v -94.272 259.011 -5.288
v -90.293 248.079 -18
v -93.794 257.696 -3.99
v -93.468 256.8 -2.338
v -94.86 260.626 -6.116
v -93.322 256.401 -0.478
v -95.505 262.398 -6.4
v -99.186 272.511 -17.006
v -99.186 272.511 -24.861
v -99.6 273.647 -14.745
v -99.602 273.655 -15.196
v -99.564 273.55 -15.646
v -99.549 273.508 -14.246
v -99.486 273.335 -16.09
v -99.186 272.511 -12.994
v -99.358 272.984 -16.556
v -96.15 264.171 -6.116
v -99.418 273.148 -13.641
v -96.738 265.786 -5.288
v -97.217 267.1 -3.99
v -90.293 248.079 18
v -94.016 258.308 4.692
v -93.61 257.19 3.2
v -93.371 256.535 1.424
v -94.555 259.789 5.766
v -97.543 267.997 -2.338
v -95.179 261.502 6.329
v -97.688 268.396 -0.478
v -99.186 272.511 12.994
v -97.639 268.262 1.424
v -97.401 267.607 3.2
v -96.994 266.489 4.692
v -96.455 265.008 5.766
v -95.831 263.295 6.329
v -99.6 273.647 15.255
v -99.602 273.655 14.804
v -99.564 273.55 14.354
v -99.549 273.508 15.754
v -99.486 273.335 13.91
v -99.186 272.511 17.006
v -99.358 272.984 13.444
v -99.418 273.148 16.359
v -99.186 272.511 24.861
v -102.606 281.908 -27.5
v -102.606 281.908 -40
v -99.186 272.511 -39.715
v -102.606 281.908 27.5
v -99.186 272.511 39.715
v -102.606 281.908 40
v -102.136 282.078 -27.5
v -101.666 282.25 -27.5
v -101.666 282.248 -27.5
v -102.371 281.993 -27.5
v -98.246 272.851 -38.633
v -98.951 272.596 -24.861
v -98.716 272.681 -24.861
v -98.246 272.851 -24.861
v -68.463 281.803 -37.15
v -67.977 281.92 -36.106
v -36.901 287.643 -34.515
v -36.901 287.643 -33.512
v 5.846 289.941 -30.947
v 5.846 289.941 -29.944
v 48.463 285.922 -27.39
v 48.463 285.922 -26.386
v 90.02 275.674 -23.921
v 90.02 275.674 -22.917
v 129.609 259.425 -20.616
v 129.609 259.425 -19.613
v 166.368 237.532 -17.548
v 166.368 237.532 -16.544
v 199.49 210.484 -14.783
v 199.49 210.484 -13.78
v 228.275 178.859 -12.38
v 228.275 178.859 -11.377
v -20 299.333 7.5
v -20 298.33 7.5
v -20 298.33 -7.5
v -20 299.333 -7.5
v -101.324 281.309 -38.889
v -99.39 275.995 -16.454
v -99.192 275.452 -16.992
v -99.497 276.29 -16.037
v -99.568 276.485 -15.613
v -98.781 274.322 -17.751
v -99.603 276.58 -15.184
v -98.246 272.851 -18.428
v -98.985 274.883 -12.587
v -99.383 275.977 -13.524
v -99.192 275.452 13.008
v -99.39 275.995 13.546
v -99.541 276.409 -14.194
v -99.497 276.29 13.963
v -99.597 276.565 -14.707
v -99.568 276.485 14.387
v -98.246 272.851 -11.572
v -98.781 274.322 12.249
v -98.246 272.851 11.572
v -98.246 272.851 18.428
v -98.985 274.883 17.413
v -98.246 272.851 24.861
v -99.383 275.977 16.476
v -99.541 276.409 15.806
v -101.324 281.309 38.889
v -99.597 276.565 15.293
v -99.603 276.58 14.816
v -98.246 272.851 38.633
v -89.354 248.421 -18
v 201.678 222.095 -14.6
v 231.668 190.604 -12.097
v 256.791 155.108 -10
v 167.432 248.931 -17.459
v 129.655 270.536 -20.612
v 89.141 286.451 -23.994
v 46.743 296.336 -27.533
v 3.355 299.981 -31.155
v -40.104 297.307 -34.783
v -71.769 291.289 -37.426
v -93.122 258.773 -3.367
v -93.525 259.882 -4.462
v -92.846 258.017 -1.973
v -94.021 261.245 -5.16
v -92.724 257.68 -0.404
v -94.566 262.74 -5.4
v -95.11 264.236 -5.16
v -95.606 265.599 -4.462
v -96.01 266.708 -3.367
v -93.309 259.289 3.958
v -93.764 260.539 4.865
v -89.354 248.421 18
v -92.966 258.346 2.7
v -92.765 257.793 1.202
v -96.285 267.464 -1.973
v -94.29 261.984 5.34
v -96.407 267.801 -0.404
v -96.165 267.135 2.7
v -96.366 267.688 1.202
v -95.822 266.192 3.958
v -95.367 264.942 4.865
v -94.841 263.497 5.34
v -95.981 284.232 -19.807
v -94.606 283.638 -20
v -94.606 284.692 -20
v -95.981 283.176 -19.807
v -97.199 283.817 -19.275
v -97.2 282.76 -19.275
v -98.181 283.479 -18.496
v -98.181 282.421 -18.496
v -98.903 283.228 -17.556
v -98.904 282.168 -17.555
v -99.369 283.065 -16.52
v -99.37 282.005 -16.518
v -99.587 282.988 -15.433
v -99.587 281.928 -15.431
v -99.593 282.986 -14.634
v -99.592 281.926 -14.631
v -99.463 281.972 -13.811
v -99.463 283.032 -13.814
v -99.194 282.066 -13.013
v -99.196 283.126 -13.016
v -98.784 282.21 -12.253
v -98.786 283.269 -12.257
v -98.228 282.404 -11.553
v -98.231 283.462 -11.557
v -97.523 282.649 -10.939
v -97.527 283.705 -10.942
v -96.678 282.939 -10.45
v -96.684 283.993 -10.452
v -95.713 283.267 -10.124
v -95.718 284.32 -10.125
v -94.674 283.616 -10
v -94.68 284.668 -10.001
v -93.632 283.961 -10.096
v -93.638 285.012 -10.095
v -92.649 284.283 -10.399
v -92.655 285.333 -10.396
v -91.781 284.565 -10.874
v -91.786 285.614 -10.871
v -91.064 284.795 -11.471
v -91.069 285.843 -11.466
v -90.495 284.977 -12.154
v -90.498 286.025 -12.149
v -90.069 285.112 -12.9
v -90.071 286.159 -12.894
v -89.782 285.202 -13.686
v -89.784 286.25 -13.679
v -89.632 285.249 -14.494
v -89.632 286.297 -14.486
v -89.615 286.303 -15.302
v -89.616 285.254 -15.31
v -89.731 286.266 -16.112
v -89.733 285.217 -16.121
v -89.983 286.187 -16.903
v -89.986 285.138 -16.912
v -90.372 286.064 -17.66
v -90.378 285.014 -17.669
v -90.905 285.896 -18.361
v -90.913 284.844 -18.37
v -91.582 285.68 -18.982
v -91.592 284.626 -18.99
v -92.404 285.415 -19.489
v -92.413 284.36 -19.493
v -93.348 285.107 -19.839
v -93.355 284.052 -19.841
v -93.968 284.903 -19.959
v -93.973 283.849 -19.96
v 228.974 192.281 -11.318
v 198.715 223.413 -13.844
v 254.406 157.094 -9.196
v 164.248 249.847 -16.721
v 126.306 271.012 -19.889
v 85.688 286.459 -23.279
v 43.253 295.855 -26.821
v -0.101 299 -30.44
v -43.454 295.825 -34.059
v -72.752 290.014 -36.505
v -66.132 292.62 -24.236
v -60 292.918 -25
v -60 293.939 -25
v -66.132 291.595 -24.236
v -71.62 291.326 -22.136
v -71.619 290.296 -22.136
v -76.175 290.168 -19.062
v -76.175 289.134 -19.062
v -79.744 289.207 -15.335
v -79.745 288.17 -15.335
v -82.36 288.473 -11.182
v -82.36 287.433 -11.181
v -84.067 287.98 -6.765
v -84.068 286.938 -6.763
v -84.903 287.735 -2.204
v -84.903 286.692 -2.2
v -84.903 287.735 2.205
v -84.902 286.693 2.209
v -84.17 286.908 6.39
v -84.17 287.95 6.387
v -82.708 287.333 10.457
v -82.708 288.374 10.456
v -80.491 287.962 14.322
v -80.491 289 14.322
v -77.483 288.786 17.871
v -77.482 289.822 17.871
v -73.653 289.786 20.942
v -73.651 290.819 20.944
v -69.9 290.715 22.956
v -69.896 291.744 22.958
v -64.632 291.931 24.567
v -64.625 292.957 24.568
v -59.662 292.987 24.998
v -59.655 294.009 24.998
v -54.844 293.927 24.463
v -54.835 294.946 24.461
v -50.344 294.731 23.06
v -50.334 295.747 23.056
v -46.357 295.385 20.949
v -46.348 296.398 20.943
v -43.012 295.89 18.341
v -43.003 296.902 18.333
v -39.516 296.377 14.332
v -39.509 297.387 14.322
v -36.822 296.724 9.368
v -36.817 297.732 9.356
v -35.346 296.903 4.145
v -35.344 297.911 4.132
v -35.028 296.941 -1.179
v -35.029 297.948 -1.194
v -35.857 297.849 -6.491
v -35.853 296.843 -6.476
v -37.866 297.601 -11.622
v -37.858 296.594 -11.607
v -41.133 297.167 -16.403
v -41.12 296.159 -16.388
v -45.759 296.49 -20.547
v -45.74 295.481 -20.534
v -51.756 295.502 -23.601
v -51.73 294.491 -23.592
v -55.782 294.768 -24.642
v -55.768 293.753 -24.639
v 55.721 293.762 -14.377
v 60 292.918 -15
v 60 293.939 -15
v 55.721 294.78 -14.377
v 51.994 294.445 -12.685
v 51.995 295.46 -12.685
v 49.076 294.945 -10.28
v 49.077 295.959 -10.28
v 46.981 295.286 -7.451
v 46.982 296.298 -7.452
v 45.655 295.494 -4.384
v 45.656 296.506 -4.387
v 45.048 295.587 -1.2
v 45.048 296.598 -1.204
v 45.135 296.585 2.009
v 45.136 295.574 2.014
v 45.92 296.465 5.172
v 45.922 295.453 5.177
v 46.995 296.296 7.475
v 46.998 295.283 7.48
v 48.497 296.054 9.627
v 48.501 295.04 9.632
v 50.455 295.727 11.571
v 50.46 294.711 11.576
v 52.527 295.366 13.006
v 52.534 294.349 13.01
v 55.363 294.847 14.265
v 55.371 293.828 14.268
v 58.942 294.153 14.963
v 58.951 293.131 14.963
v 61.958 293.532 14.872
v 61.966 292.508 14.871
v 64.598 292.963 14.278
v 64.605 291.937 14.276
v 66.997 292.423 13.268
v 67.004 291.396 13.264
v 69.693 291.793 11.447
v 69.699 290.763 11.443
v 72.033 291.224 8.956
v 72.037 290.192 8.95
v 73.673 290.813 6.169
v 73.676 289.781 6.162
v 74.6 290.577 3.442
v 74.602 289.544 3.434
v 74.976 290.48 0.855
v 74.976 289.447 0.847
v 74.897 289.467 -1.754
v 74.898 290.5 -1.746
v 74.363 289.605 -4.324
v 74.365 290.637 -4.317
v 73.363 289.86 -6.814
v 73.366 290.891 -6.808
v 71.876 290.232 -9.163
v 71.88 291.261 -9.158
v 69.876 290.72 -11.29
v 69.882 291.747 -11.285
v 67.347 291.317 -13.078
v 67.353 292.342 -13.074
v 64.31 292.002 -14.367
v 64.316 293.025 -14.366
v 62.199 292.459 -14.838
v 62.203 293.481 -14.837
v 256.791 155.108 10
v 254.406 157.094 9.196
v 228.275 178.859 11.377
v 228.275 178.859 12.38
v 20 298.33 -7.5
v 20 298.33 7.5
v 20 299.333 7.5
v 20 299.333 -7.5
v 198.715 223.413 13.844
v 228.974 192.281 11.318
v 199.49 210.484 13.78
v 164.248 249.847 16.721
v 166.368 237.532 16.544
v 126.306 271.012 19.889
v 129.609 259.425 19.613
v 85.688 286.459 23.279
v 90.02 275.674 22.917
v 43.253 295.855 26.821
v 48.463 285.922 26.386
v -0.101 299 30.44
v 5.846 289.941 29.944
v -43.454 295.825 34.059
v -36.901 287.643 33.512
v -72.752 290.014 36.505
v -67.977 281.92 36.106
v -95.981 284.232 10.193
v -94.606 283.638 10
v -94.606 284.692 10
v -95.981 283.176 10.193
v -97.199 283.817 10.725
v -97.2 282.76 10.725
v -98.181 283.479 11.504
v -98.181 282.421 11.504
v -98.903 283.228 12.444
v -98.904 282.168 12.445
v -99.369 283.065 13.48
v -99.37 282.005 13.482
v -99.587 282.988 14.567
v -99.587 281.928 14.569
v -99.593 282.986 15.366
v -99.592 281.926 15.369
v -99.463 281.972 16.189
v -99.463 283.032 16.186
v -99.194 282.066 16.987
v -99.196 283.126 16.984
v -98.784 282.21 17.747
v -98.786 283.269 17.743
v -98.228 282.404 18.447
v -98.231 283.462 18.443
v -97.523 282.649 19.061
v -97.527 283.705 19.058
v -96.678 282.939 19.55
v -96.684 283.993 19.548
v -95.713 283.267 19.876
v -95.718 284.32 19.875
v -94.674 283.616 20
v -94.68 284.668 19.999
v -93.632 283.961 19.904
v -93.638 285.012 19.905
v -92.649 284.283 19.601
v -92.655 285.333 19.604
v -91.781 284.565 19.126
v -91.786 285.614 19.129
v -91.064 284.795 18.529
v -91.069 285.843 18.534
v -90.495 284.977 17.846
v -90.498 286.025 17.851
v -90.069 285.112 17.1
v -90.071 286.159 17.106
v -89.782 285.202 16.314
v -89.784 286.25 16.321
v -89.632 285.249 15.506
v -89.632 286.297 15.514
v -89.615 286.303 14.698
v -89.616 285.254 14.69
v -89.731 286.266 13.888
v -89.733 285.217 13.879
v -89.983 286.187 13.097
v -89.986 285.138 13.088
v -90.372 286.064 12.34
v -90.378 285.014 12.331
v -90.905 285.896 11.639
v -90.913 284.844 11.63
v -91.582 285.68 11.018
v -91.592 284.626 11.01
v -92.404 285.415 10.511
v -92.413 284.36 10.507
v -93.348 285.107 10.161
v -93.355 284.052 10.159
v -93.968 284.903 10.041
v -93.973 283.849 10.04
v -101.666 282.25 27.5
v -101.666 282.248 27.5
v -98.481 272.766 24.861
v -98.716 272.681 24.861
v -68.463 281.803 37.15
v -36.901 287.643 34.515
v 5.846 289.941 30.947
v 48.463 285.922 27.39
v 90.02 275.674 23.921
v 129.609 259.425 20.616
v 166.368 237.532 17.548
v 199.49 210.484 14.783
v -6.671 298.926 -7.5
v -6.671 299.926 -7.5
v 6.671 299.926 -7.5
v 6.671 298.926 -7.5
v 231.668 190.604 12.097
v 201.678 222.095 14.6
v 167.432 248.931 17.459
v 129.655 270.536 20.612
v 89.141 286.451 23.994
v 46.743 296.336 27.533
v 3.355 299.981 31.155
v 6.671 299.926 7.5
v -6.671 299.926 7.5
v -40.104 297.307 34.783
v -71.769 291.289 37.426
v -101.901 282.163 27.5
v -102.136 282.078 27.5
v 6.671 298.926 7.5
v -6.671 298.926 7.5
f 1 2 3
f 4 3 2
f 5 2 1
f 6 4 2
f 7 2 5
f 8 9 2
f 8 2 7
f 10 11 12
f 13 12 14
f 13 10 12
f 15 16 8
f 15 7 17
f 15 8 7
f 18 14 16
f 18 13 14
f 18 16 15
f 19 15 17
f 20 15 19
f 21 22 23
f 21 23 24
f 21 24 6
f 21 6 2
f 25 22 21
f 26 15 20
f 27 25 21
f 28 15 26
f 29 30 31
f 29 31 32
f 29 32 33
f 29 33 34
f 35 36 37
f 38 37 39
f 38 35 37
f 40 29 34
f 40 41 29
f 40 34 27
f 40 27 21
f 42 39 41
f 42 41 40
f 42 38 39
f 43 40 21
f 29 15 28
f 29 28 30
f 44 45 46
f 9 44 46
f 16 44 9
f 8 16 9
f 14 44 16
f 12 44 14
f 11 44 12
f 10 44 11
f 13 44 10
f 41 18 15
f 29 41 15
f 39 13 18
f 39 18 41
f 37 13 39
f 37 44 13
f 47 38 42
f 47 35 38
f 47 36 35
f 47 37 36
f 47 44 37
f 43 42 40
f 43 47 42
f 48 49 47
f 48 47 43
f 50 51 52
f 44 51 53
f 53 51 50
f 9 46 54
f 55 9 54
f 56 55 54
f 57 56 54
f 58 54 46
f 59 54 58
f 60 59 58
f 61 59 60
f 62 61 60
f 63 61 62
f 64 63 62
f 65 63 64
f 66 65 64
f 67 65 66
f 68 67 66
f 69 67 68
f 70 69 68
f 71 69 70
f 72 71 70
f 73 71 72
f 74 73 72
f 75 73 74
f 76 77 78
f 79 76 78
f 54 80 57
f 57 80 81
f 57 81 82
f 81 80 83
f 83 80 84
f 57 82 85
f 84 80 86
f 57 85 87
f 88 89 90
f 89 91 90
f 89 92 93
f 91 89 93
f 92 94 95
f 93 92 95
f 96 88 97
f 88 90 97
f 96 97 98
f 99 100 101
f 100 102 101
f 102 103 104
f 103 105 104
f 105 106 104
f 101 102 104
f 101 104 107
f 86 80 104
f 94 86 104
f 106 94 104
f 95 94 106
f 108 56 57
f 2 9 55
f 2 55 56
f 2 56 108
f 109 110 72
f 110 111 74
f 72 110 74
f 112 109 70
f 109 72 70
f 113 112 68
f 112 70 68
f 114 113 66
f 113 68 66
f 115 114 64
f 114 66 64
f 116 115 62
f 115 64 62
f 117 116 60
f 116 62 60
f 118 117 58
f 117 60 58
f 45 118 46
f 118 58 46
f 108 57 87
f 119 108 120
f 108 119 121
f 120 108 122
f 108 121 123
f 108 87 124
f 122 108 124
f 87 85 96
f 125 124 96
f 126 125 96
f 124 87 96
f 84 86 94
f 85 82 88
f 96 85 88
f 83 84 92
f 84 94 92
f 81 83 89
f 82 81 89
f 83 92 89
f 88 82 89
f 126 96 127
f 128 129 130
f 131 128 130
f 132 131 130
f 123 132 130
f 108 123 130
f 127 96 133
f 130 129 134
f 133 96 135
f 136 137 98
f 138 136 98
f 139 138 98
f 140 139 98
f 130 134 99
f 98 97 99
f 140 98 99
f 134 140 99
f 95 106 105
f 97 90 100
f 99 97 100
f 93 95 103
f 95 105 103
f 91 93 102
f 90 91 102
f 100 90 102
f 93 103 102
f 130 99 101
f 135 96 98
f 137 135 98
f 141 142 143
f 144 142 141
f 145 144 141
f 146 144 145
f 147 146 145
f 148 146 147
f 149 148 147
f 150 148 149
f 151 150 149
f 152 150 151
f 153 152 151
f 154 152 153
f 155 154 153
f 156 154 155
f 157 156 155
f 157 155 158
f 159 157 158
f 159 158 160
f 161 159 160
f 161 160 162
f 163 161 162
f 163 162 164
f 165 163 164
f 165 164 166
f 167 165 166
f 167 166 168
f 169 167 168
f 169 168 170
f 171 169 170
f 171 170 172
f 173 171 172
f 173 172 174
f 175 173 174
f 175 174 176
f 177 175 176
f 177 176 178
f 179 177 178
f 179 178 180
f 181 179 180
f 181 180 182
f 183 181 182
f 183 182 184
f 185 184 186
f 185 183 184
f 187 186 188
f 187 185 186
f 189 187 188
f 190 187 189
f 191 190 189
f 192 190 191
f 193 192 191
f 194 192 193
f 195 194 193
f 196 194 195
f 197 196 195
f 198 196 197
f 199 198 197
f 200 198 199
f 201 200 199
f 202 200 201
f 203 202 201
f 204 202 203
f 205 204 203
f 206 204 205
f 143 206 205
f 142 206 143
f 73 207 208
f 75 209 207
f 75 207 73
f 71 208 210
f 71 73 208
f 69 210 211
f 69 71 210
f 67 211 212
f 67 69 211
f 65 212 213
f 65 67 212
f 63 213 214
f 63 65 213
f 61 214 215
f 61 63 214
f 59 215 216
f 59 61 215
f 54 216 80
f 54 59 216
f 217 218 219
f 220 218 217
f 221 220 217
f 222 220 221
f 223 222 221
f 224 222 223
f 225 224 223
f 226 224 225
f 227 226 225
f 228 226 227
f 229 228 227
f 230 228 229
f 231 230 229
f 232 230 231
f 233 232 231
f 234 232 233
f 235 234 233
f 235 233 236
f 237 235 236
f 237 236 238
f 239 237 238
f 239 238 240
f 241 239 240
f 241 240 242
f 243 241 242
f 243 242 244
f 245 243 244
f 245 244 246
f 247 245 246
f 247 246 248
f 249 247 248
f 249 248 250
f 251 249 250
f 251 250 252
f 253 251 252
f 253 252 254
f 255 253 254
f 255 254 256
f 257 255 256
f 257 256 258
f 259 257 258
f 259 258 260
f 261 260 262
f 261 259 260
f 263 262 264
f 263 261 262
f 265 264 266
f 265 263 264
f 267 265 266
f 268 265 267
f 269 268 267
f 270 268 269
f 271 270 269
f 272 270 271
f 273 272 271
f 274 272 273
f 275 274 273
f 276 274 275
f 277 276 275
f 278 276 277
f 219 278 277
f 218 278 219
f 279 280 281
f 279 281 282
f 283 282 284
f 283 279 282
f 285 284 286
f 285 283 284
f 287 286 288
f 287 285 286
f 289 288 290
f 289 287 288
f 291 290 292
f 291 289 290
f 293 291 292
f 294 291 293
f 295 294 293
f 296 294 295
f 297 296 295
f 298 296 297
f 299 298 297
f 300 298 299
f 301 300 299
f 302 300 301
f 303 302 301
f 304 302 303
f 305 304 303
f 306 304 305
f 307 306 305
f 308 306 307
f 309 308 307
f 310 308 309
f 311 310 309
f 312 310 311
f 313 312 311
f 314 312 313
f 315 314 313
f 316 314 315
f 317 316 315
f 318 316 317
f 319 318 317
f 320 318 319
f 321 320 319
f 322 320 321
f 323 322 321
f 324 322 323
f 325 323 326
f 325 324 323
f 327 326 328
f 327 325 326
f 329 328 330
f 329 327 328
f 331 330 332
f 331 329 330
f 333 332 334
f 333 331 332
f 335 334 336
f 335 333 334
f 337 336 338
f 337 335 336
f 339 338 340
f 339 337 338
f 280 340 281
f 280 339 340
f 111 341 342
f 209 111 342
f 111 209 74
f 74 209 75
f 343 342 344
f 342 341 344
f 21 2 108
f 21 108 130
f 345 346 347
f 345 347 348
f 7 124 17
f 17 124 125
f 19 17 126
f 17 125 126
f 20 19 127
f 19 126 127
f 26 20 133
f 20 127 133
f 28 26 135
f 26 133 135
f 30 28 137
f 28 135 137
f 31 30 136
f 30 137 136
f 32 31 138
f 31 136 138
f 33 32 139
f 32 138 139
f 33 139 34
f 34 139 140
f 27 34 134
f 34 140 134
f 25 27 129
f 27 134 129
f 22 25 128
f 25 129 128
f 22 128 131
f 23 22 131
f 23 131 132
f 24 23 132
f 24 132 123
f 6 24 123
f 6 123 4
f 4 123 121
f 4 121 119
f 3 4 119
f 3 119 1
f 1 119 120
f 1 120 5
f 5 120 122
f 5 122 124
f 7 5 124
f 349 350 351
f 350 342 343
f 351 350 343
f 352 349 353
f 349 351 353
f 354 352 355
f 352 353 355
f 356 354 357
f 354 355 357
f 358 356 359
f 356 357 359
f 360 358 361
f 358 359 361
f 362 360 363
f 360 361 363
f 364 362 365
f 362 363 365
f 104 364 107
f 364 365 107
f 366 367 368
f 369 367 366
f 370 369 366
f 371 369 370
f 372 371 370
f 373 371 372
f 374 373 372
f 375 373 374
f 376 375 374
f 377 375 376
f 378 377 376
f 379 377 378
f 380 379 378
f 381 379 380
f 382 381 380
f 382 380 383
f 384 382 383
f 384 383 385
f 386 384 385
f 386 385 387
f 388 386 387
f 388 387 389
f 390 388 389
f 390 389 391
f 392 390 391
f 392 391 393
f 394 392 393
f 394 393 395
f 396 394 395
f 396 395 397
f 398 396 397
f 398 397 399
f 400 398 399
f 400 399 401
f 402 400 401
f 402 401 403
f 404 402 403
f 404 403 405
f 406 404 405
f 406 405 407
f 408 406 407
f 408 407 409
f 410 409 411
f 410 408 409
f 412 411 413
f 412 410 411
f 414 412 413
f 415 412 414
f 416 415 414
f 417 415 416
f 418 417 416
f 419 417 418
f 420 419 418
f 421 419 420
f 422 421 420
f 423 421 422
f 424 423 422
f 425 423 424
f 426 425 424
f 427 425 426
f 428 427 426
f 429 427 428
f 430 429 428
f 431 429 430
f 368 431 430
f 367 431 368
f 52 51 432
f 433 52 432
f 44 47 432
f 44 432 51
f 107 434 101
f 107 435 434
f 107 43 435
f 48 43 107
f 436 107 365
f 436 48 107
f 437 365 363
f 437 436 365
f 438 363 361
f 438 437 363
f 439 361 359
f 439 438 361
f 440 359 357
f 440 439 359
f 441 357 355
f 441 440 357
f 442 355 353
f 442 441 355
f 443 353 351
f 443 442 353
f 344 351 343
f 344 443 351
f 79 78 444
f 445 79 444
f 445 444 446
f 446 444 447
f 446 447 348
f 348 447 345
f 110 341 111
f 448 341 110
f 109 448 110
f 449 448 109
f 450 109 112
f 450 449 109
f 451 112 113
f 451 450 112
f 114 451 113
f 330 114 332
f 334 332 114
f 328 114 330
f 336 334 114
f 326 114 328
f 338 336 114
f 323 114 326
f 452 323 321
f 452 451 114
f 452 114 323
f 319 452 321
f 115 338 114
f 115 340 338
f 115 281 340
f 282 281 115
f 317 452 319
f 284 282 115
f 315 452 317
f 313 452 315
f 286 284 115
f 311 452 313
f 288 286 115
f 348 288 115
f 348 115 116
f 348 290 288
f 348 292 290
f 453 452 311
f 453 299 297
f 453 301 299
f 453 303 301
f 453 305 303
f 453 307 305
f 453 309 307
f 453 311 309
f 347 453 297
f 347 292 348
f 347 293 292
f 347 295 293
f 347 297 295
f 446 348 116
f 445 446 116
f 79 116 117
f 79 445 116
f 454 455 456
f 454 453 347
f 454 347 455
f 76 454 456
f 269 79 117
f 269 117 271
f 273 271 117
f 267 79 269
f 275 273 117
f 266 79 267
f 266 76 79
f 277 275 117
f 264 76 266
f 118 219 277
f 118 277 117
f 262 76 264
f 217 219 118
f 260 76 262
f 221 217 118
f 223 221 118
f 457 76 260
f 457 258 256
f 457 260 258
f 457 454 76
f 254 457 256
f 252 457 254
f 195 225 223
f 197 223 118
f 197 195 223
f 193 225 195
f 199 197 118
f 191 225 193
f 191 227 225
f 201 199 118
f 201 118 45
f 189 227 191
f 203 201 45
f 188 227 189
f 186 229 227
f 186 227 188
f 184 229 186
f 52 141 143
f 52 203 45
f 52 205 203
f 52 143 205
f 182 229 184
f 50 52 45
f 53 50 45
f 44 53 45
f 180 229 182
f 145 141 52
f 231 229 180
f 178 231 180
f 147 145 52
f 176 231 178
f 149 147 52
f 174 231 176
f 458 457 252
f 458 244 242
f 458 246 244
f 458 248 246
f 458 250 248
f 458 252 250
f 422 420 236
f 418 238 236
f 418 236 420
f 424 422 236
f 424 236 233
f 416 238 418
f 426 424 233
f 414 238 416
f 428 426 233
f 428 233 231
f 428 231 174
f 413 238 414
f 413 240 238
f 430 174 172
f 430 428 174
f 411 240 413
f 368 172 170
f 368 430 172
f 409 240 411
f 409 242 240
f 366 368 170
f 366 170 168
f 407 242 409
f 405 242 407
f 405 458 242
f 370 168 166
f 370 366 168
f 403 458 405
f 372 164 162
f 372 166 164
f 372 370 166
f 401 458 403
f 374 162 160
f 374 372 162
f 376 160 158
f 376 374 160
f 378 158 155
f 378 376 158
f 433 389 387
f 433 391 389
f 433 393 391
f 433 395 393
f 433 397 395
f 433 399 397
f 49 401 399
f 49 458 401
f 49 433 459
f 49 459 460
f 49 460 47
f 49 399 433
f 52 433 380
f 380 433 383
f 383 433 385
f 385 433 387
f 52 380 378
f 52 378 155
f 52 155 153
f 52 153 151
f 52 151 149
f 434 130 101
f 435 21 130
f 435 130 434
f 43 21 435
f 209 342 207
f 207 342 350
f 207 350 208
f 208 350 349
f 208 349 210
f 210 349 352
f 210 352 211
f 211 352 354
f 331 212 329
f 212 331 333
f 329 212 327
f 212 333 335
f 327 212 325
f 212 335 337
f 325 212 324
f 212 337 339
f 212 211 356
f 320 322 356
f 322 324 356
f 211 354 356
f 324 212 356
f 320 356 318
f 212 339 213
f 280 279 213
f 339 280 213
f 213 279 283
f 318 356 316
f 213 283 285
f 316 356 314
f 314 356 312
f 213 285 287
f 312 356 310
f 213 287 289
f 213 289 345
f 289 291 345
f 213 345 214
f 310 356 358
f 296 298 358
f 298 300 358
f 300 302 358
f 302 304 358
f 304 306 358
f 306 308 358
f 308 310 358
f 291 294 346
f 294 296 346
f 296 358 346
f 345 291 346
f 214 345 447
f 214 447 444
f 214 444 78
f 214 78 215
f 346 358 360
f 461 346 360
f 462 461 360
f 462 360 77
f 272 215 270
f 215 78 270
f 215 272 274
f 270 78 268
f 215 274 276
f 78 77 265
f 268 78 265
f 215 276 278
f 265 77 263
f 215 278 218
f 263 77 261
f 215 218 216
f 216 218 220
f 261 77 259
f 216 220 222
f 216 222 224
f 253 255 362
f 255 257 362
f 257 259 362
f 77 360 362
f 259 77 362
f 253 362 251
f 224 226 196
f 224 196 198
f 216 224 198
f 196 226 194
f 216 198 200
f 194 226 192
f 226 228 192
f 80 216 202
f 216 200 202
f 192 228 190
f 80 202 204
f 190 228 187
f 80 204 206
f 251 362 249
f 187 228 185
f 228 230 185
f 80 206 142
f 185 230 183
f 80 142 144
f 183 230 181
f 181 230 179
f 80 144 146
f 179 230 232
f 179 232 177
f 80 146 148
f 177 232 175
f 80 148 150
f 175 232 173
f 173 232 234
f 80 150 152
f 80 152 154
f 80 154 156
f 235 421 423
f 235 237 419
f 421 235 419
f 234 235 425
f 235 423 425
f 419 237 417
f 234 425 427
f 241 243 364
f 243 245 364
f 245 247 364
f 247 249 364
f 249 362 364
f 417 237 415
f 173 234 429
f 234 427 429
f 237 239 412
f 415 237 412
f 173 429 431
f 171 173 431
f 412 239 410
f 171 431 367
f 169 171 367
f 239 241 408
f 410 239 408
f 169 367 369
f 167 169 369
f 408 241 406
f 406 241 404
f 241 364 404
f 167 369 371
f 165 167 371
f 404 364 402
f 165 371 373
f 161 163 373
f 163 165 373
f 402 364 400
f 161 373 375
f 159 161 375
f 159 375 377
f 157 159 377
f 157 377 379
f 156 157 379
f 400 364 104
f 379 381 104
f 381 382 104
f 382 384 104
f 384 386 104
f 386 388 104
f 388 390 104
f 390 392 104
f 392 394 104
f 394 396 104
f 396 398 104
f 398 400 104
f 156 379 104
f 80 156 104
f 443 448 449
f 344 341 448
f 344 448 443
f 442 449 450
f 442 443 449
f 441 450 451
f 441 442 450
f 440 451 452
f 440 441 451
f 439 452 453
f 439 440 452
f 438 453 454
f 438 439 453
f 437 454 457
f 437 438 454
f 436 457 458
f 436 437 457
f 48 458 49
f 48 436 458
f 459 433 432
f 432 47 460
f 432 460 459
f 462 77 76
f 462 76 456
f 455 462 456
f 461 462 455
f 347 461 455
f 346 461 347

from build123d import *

# Parameters (mm, degrees)
EXTRUDE_1_DEPTH     = 40
CUT_EXTRUDE_1_DEPTH = 397.915070509
SHELL_2_T           = -1
SKETCH_3_W          = 40
SKETCH_3_H          = 15
CUT_EXTRUDE_2_DEPTH = 397.915070509
SKETCH_4_R          = 25
SKETCH_4_R_2        = 15
SKETCH_4_R_3        = 5
CUT_EXTRUDE_3_DEPTH = 397.915070509
CUT_EXTRUDE_4_DEPTH = 40
EXTRUDE_2_DEPTH     = 1
SKETCH_7_R          = 5
CUT_EXTRUDE_5_DEPTH = 1
MM_1_D              = 1
MM_1_DEPTH          = 12.4
MM_1_CSINK_D        = 12.8
MM_1_CSINK_ANGLE    = 90
MM_1_TIP            = 0.30043031


with BuildPart() as part:
    # 草图1 → 凸台-拉伸1 (new, symmetric)
    with BuildSketch(Plane.XY):
        with BuildLine():
            Line((-102.606042998, 281.907786236), (-99.185841564, 272.510860028))
            ThreePointArc((-99.185841564, 272.510860028), (96.486714963, 273.478177988), (248.231216272, 149.937531219))
            Line((248.231216272, 149.937531219), (256.790913385, 155.107790916))
            ThreePointArc((256.790913385, 155.107790916), (99.813843065, 282.908459988), (-102.606042998, 281.907786236))
        make_face()
    extrude(amount=EXTRUDE_1_DEPTH, both=True)

    # 草图2 → 切除-拉伸1 (cut, through all)
    with BuildSketch(Plane(origin=(0, 0, 0), x_dir=(1, 0, 0), z_dir=(0, 1, 0))):
        Polygon((-102.606042998, 40), (256.790913385, 40), (256.790913385, 10), align=None)
        Polygon((256.790913385, -40), (256.790913385, -10), (-102.606042998, -40), align=None)
    extrude(amount=CUT_EXTRUDE_1_DEPTH, mode=Mode.SUBTRACT)

    # 抽壳2
    shell_2_openings = [part.faces().sort_by_distance(p)[0] for p in [
        (96.486714963, 273.478177988, 0),
    ]]
    offset(amount=SHELL_2_T, openings=shell_2_openings, kind=Kind.INTERSECTION)

    # 草图3 → 切除-拉伸2 (cut, through all)
    with BuildSketch(Plane(origin=(0, 0, 0), x_dir=(1, 0, 0), z_dir=(0, 1, 0))):
        Rectangle(SKETCH_3_W, SKETCH_3_H)
    extrude(amount=CUT_EXTRUDE_2_DEPTH, mode=Mode.SUBTRACT)

    # 草图4 → 切除-拉伸3 (cut, through all)
    with BuildSketch(Plane(origin=(0, 0, 0), x_dir=(1, 0, 0), z_dir=(0, 1, 0))):
        with Locations(Location((-60, 0, 0), (0, 0, 90))):
            Circle(SKETCH_4_R)
        with Locations(Location((60, 0, 0), (0, 0, 90))):
            Circle(SKETCH_4_R_2)
        with Locations(Location((-94.606042998, 15, 0), (0, 0, 90))):
            Circle(SKETCH_4_R_3)
        with Locations(Location((-94.606042998, -15, 0), (0, 0, 90))):
            Circle(SKETCH_4_R_3)
    extrude(amount=CUT_EXTRUDE_3_DEPTH, mode=Mode.SUBTRACT)

    # 草图5 → 切除-拉伸4 (cut, symmetric)
    with BuildSketch(Plane.XY):
        Polygon((256.790913385, 155.107790916), (228.27486074, 178.859128797), (202.085250624, 147.415666345), (242.532887063, 124.067442195), align=None)
    extrude(amount=CUT_EXTRUDE_4_DEPTH, both=True, mode=Mode.SUBTRACT)

    # 草图6 → 凸台-拉伸2 (add)
    with BuildSketch(Plane(origin=(0, 0, 0), x_dir=(0, 0, 1), z_dir=(-0.9396926207859102, -0.34202014332566405, 0))):
        Polygon((-27.5, 300), (-18, 264), (18, 264), (27.5, 300), align=None)
    extrude(amount=-EXTRUDE_2_DEPTH)

    # 草图7 → 切除-拉伸5 (cut)
    with BuildSketch(Plane(origin=(0, 0, 0), x_dir=(0, 0, 1), z_dir=(-0.9396926207859102, -0.34202014332566405, 0))):
        with Locations(Location((0, 279.238588323, 0), (0, 0, 270))):
            Circle(SKETCH_7_R)
    extrude(amount=-CUT_EXTRUDE_5_DEPTH, mode=Mode.SUBTRACT)

    # 大小mm 暗销孔1
    with Locations(Plane(origin=(0, 0, 0), x_dir=(0, 0, 1), z_dir=(-0.9396926207859102, -0.34202014332566405, 0))):
        with Locations((0, 279.238588323)):
            CounterSinkHole(MM_1_D / 2, MM_1_CSINK_D / 2, depth=MM_1_DEPTH, counter_sink_angle=MM_1_CSINK_ANGLE)
            with Locations((0, 0, -(MM_1_DEPTH + MM_1_TIP / 2))):  # 118° drill point
                Cone(0, MM_1_D / 2, MM_1_TIP, mode=Mode.SUBTRACT)


solid = part.part
